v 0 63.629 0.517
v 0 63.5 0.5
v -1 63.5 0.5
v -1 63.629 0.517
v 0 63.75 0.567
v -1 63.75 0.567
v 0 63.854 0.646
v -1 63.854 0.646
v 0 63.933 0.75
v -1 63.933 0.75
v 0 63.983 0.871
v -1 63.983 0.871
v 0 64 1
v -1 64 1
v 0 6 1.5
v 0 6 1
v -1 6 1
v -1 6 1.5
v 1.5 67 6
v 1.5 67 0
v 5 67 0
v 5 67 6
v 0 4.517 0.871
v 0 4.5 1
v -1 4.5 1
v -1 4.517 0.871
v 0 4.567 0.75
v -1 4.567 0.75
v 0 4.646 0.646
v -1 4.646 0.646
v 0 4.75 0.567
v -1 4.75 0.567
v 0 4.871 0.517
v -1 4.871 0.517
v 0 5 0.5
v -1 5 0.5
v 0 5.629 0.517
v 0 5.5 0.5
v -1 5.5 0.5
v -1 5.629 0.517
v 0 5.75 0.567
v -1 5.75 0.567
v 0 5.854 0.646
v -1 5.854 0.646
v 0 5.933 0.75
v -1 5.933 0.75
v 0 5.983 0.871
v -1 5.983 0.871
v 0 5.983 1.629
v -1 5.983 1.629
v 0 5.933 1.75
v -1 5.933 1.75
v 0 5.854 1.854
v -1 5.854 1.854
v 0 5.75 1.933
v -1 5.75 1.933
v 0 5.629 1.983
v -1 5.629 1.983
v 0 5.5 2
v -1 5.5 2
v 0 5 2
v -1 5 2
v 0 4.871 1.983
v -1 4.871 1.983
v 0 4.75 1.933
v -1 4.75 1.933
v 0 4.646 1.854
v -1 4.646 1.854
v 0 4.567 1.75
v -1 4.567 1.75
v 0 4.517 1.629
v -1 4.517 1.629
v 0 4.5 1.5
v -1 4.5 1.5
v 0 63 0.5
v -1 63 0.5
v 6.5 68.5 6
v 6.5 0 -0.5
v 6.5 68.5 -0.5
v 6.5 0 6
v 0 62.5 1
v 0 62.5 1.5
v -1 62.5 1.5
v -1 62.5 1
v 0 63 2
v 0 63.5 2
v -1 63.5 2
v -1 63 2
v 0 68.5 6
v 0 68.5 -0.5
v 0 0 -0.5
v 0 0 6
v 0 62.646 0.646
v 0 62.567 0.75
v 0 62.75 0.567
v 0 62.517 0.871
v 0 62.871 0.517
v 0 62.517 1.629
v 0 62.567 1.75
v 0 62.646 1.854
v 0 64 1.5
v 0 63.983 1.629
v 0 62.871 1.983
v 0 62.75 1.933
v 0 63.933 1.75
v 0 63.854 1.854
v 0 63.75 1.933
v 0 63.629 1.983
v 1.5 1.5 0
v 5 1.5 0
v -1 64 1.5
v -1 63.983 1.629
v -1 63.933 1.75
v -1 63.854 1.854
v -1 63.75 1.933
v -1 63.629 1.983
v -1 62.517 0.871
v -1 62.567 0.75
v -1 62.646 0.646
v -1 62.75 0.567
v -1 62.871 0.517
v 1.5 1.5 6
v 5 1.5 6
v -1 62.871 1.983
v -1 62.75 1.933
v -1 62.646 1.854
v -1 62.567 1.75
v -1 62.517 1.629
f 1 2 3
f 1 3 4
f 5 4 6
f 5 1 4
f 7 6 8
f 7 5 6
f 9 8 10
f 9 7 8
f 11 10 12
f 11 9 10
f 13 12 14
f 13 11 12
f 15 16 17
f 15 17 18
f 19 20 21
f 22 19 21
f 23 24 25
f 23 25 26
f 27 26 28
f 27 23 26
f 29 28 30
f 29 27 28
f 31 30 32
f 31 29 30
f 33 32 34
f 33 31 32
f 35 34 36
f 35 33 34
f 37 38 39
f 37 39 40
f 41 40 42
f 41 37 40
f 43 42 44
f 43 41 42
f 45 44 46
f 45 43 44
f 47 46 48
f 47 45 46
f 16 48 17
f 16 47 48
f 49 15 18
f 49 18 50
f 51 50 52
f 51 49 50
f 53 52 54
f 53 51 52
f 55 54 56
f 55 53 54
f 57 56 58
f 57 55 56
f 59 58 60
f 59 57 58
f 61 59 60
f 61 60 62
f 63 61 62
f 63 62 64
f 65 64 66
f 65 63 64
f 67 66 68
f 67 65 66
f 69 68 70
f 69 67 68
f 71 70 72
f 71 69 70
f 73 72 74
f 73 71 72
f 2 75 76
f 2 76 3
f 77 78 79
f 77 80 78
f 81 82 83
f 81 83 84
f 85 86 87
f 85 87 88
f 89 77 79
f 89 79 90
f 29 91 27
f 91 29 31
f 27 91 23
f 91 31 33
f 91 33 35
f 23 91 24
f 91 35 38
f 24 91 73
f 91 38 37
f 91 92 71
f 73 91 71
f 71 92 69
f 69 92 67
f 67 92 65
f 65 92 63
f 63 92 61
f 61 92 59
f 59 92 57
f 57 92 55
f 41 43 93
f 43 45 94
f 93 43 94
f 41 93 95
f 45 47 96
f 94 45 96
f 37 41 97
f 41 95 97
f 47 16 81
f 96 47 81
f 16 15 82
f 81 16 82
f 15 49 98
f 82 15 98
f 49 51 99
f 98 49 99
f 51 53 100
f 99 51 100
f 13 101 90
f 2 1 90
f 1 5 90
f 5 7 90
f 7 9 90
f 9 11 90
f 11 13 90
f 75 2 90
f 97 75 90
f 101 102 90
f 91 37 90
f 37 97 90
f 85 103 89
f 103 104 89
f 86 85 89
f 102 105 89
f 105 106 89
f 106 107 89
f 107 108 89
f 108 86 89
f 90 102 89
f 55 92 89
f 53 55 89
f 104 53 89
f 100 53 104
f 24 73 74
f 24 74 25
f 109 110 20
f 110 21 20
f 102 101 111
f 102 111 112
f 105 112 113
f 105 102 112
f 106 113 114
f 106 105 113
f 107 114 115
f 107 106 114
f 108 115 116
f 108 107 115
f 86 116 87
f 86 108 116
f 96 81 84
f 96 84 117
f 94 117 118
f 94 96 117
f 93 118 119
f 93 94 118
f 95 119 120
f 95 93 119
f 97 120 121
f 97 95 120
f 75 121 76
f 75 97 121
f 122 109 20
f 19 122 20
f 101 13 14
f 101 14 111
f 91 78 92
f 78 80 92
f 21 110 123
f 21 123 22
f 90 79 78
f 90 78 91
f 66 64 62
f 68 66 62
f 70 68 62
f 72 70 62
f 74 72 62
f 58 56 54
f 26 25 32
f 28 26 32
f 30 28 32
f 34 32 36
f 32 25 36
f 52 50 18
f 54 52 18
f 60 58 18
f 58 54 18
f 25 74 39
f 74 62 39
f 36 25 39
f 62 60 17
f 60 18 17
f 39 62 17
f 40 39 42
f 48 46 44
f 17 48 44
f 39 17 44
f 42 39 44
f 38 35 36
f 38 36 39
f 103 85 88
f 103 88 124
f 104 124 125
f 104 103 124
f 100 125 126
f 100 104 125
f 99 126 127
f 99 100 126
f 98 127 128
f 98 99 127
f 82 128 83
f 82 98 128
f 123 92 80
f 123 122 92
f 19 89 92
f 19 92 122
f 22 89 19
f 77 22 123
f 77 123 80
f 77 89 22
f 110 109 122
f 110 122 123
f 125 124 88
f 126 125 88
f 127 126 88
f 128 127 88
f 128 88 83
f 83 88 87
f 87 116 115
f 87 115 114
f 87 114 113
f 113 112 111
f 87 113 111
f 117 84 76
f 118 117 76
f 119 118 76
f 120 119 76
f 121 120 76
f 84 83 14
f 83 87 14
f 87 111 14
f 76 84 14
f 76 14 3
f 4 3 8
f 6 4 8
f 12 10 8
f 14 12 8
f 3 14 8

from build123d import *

# Parameters (mm, degrees)
SKETCH1_W           = 6.5
SKETCH1_H           = 68.5
SKETCH1_W_2         = 3.5
SKETCH1_H_2         = 65.5
BOSS_EXTRUDE1_DEPTH = 6
SKETCH2_W           = 6.5
SKETCH2_H           = 68.5
BOSS_EXTRUDE2_DEPTH = 0.5
BOSS_EXTRUDE3_DEPTH = 1


with BuildPart() as part:
    # Sketch1 → Boss-Extrude1 (new body)
    with BuildSketch(Plane.XY):
        with Locations((3.25, 34.25)):
            Rectangle(SKETCH1_W, SKETCH1_H)
        with Locations((3.25, 34.25)):
            Rectangle(SKETCH1_W_2, SKETCH1_H_2, mode=Mode.SUBTRACT)
    extrude(amount=BOSS_EXTRUDE1_DEPTH)

    # Sketch2 → Boss-Extrude2 (add)
    with BuildSketch(Plane(origin=(0, 0, 0), x_dir=(-1, 0, 0), z_dir=(0, 0, -1))):
        with Locations((-3.25, 34.25)):
            Rectangle(SKETCH2_W, SKETCH2_H)
    extrude(amount=BOSS_EXTRUDE2_DEPTH)

    # Sketch3 → Boss-Extrude3 (add)
    with BuildSketch(Plane.ZY):
        with BuildLine():
            Line((1, 64), (1.5, 64))
            ThreePointArc((1.5, 64), (1.853553391, 63.853553391), (2, 63.5))
            Line((2, 63.5), (2, 63))
            ThreePointArc((2, 63), (1.853553391, 62.646446609), (1.5, 62.5))
            Line((1.5, 62.5), (1, 62.5))
            ThreePointArc((1, 62.5), (0.646446609, 62.646446609), (0.5, 63))
            Line((0.5, 63), (0.5, 63.5))
            ThreePointArc((0.5, 63.5), (0.646446609, 63.853553391), (1, 64))
        make_face()
        with BuildLine():
            Line((1, 6), (1.5, 6))
            ThreePointArc((1.5, 6), (1.853553391, 5.853553391), (2, 5.5))
            Line((2, 5.5), (2, 5))
            ThreePointArc((2, 5), (1.853553391, 4.646446609), (1.5, 4.5))
            Line((1.5, 4.5), (1, 4.5))
            ThreePointArc((1, 4.5), (0.646446609, 4.646446609), (0.5, 5))
            Line((0.5, 5), (0.5, 5.5))
            ThreePointArc((0.5, 5.5), (0.646446609, 5.853553391), (1, 6))
        make_face()
    extrude(amount=BOSS_EXTRUDE3_DEPTH)


solid = part.part
